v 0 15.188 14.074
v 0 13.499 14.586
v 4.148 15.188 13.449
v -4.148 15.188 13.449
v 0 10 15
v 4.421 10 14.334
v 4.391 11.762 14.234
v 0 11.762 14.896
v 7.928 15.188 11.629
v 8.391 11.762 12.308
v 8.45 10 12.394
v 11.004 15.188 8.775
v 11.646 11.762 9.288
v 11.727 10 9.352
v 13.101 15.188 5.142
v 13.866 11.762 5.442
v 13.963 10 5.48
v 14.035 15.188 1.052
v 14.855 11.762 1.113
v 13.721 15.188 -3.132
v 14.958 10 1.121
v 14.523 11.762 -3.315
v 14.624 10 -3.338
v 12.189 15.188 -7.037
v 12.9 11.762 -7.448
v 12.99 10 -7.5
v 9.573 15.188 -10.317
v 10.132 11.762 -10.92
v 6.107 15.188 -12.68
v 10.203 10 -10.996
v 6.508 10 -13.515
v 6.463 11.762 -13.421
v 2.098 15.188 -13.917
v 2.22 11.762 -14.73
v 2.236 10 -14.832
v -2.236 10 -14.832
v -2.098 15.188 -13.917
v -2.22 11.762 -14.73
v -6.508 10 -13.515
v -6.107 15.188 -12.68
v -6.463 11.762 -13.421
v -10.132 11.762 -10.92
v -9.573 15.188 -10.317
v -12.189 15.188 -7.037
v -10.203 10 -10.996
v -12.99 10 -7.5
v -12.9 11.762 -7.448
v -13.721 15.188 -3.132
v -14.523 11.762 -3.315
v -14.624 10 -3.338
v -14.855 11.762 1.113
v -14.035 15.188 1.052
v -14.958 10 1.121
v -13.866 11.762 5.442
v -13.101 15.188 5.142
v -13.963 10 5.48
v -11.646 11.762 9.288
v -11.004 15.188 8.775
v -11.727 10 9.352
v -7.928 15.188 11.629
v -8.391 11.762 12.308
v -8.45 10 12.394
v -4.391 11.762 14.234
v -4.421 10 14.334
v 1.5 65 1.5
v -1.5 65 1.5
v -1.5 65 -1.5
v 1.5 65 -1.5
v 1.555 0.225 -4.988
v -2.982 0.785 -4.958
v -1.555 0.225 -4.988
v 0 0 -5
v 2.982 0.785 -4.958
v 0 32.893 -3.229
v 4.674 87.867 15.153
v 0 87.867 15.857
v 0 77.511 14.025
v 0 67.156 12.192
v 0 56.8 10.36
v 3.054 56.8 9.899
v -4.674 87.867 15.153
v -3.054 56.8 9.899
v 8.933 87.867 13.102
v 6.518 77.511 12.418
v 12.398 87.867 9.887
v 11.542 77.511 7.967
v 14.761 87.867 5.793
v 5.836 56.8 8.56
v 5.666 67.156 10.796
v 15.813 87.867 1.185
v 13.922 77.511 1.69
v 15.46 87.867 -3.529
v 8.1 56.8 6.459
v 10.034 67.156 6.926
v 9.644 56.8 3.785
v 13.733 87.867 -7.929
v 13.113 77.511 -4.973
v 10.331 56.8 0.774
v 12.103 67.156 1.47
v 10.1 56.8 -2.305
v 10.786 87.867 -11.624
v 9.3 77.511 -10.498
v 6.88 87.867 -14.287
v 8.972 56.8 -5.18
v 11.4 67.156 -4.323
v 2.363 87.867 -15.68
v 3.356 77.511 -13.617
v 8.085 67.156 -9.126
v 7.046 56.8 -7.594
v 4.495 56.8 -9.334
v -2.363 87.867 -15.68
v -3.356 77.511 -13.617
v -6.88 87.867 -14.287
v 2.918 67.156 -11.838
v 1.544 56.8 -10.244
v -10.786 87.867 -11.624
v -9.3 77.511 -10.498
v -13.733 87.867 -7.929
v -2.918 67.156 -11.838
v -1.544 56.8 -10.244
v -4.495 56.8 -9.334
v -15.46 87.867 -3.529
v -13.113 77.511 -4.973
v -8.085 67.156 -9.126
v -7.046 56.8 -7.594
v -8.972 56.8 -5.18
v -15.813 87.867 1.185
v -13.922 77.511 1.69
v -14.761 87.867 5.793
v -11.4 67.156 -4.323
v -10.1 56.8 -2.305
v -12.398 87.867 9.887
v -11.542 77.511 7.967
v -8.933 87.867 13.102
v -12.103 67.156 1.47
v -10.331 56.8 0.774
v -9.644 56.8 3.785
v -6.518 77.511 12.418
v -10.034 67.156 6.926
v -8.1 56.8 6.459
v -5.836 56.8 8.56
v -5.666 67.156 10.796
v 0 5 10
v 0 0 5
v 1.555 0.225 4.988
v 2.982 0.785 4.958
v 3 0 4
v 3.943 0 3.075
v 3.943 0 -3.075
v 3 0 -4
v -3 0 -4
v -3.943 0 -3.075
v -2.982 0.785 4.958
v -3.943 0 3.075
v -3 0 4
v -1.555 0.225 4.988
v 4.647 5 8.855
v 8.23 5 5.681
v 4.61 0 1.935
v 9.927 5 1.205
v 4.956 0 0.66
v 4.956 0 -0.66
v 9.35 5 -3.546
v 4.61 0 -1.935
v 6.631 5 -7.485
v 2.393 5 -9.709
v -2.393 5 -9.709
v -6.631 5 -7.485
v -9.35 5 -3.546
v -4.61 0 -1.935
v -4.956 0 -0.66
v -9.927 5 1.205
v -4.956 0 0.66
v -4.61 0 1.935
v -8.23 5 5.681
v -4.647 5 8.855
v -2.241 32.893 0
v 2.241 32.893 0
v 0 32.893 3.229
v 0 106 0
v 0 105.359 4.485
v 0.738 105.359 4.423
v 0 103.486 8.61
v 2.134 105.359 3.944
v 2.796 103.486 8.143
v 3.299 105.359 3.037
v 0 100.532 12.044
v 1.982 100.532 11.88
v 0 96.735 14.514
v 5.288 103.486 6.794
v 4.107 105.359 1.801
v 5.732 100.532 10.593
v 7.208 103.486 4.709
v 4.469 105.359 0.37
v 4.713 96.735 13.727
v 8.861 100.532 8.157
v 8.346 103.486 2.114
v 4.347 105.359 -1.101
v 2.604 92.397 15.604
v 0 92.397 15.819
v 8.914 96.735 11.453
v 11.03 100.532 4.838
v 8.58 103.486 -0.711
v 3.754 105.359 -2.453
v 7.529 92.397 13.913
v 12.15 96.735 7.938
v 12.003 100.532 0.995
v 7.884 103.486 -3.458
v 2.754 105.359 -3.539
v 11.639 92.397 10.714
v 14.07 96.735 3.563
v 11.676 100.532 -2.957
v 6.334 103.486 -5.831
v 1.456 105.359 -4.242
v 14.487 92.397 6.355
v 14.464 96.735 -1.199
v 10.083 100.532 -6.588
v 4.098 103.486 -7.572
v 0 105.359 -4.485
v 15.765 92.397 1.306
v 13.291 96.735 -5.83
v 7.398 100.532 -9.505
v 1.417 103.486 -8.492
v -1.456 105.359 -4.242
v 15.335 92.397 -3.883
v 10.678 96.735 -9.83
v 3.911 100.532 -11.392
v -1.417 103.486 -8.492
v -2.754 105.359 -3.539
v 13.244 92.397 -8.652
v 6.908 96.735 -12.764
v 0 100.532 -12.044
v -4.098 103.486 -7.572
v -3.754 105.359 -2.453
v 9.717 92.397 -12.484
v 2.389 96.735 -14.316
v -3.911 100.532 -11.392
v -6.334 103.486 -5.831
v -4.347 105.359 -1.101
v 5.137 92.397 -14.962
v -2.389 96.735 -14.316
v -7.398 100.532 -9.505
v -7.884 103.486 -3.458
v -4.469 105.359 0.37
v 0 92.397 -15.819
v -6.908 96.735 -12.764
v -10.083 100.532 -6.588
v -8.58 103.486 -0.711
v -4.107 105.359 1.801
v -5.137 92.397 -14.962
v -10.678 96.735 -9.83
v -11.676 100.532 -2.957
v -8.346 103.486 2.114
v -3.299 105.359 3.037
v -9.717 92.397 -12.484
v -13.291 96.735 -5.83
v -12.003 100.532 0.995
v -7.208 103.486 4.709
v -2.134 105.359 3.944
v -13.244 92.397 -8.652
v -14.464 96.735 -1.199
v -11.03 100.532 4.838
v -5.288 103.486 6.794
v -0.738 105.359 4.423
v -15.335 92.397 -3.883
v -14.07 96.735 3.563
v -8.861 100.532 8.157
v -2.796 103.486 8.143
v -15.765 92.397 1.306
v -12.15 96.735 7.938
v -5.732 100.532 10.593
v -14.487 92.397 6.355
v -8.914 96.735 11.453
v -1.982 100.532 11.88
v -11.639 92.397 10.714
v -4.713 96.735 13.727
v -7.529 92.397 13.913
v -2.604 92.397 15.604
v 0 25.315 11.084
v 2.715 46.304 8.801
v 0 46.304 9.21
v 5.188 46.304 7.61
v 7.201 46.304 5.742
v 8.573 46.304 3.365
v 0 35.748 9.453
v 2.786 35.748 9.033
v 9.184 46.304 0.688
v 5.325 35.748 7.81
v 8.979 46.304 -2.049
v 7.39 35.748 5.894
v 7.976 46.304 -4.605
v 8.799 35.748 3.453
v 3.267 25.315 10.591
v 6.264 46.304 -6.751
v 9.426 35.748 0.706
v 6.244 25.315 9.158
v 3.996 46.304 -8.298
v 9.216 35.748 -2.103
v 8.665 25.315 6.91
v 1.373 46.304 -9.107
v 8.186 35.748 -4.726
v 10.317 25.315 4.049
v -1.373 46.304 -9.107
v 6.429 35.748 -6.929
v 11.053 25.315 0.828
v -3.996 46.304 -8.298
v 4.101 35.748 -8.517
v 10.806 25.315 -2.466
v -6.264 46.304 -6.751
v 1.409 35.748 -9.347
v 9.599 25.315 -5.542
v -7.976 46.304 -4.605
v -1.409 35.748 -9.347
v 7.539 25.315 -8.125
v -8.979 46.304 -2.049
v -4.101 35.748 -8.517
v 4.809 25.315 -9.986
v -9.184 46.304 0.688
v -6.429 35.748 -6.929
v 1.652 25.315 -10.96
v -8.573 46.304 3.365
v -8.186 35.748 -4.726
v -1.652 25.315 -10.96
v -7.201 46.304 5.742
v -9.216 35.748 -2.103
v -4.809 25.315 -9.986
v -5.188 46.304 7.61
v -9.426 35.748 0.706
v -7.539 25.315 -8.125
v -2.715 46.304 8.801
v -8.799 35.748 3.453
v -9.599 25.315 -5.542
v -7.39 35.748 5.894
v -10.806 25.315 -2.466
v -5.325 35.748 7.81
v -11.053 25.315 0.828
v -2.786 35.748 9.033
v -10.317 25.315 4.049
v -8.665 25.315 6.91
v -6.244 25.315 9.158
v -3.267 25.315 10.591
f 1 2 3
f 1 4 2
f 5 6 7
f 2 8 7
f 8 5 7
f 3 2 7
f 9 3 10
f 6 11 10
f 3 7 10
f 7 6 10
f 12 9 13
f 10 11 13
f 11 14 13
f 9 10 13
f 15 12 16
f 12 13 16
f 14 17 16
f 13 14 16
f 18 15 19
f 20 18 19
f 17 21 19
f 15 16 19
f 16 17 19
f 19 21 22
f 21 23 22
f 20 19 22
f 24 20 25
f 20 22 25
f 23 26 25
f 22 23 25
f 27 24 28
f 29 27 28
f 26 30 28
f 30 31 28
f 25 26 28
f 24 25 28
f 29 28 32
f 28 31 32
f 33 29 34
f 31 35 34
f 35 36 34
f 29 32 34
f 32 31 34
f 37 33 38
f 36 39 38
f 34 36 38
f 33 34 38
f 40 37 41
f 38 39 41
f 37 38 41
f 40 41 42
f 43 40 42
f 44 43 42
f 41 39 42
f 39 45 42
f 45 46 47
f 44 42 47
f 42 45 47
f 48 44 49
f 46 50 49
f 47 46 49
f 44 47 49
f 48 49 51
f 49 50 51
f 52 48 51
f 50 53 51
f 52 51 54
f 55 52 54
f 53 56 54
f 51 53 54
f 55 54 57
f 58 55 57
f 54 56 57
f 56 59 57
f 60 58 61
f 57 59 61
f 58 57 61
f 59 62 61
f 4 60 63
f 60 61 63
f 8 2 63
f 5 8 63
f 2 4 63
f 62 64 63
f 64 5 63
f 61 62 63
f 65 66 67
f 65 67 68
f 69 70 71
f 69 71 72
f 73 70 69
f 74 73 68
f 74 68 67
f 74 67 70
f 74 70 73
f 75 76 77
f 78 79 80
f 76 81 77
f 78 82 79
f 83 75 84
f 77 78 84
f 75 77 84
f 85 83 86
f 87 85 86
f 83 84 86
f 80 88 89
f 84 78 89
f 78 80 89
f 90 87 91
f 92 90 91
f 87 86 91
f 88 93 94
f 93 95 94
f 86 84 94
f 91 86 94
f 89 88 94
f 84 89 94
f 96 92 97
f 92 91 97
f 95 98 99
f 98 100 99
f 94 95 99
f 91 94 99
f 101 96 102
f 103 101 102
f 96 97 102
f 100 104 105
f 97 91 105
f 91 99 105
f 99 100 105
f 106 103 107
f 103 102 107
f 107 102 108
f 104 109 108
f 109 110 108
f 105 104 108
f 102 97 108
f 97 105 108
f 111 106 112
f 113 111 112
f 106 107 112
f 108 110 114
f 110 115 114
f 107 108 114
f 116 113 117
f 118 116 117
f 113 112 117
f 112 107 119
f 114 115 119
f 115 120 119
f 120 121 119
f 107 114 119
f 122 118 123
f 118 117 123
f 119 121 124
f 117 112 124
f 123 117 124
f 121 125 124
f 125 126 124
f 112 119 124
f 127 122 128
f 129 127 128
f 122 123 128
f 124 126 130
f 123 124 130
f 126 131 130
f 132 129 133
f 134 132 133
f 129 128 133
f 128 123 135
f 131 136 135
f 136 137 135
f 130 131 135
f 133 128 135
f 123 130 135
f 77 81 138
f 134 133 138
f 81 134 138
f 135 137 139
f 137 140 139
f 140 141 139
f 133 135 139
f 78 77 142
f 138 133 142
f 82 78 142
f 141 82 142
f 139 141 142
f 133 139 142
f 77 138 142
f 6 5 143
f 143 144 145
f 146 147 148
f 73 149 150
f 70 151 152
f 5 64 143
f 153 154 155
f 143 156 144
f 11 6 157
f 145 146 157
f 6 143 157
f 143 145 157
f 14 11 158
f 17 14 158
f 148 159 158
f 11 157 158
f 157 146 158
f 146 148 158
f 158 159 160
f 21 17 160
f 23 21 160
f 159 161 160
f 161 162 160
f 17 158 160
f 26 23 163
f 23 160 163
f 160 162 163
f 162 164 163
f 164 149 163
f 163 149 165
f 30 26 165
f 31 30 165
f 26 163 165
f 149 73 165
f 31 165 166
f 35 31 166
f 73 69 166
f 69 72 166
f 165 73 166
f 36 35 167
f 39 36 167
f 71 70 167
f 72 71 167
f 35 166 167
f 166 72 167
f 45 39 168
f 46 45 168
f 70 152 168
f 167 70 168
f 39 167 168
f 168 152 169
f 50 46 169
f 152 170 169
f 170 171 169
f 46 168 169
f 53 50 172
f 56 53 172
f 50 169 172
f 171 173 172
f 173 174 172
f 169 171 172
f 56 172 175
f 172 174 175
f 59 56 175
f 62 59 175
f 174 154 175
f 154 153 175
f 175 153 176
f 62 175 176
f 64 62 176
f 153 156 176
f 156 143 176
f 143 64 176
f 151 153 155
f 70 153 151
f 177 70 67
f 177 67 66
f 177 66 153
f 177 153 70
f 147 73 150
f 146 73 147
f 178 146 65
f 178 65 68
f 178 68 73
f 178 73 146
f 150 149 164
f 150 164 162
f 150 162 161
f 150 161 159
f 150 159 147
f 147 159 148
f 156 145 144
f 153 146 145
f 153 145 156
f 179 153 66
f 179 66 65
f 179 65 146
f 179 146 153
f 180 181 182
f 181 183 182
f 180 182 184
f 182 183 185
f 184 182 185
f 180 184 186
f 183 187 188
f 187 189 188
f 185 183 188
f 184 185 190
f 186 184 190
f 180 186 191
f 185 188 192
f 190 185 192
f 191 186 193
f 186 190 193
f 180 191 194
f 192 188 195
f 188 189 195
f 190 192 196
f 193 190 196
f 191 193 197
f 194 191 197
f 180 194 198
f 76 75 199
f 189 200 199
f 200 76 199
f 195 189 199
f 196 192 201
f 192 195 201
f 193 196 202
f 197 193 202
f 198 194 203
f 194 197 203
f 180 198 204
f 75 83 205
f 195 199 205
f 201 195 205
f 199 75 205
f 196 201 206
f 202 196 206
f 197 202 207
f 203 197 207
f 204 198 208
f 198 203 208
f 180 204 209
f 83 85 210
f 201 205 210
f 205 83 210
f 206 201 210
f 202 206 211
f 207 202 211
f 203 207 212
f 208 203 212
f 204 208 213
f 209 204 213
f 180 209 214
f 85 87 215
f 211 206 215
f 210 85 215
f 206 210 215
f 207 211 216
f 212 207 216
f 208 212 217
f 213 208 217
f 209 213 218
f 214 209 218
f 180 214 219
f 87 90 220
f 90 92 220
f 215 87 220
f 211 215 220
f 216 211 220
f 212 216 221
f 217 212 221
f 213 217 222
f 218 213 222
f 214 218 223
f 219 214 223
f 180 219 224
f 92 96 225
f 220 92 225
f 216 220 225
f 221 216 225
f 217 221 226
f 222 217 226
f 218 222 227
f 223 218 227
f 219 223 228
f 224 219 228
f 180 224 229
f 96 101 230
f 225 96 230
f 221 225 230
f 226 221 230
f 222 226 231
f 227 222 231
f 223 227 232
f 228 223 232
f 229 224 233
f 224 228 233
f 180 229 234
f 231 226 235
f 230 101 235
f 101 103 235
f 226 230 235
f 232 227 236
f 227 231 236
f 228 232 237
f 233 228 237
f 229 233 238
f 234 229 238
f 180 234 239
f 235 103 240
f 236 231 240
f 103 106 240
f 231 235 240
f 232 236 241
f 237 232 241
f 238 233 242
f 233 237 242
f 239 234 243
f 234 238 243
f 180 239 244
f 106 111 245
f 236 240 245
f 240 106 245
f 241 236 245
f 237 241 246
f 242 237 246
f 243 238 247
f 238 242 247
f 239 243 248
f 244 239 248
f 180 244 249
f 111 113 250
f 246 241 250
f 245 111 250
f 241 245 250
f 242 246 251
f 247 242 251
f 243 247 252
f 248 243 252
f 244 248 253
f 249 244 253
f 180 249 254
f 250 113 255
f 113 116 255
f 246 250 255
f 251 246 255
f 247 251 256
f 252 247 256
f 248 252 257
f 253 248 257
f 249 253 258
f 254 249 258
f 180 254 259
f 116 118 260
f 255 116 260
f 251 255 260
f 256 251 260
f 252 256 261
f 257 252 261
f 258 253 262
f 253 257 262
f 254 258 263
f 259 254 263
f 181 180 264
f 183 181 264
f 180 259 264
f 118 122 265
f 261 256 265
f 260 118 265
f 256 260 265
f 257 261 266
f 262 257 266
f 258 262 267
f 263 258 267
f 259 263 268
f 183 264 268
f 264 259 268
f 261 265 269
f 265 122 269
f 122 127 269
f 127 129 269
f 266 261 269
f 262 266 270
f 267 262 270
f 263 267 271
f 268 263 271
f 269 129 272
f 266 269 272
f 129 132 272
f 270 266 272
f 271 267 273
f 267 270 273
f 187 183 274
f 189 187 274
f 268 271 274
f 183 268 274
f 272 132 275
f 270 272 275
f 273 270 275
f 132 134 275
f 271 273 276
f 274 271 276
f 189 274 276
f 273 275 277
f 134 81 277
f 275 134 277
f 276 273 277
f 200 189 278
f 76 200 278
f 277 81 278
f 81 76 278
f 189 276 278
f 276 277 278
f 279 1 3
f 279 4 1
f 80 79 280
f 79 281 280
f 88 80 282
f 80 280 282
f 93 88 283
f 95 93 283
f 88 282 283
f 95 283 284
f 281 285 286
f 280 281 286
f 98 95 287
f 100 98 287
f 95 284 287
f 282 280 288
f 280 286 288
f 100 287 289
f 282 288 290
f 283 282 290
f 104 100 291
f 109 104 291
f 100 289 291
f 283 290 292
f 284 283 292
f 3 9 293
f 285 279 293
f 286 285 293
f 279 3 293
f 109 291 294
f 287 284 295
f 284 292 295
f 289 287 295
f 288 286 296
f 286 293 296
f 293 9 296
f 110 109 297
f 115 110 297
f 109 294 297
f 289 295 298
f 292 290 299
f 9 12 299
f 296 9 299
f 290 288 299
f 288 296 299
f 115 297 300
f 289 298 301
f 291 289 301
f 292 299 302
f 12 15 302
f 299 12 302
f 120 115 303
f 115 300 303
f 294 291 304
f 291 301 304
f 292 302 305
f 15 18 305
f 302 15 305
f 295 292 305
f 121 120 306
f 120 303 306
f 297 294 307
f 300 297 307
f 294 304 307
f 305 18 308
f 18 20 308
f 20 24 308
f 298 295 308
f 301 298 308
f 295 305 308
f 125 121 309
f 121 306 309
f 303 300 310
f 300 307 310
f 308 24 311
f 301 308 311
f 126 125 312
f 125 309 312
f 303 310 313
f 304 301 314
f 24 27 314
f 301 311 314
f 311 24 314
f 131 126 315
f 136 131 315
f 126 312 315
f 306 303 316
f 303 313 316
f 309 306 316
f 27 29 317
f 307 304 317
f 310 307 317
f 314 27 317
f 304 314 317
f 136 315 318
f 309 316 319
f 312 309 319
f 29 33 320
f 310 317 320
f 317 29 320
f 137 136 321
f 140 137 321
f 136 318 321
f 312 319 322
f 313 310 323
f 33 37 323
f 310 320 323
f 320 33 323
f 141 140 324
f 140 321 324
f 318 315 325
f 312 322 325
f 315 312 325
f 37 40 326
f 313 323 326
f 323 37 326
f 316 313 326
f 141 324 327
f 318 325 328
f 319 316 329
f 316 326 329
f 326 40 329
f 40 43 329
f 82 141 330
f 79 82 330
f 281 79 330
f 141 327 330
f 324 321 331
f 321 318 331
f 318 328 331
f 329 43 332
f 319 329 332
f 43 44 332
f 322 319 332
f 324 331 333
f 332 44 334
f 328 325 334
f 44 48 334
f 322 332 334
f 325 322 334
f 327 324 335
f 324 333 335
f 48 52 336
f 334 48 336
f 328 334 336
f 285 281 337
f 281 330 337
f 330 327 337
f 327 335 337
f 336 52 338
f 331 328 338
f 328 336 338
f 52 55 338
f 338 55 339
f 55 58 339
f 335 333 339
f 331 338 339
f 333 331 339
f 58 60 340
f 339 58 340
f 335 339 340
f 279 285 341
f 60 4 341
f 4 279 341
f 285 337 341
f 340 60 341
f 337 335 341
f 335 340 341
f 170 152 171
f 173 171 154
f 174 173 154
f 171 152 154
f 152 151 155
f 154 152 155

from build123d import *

# Parameters (mm, degrees)
F0_W = 6
F0_H = 10
F2_W = 3
F2_H = 3


# Not quite as in the source:
# - ends of sketch curves that miss each other by under 0.0002 mm in the source are joined


with BuildPart() as f3:
    # F0 (on Front) → F3 section 0
    with BuildSketch(Plane.XZ):
        Rectangle(F0_W, F0_H)
    # F2 (on offset) → F3 section 1
    with BuildSketch(Plane.XZ.offset(-65)):
        Rectangle(F2_W, F2_H)
    loft()


with BuildPart() as f5:
    # F4 (on Right) → F5 (revolve)
    with BuildSketch(Plane.YZ):
        with BuildLine():
            Line((10, 15), (0, 5))
            Line((0, 5), (0, 0))
            Line((0, 0), (106, 0))
            ThreePointArc((106, 0), (100.5324895422, 12.0443623345), (87.8666669945, 15.8571400412))
            Line((87.8666669945, 15.8571400412), (56.800088, 10.359742))
            ThreePointArc((56.800088, 10.359742), (35.7475326189, 9.4526994667), (15.1884568347, 14.0740865517))
            ThreePointArc((15.1884568347, 14.0740865517), (12.6352134757, 14.7667074847), (10, 15))
        make_face()
    revolve(axis=Axis((0, 53, 0), (0, 1, 0)))

    # F6: cut F3
    add(f3.part, mode=Mode.SUBTRACT)


solid = f5.part
